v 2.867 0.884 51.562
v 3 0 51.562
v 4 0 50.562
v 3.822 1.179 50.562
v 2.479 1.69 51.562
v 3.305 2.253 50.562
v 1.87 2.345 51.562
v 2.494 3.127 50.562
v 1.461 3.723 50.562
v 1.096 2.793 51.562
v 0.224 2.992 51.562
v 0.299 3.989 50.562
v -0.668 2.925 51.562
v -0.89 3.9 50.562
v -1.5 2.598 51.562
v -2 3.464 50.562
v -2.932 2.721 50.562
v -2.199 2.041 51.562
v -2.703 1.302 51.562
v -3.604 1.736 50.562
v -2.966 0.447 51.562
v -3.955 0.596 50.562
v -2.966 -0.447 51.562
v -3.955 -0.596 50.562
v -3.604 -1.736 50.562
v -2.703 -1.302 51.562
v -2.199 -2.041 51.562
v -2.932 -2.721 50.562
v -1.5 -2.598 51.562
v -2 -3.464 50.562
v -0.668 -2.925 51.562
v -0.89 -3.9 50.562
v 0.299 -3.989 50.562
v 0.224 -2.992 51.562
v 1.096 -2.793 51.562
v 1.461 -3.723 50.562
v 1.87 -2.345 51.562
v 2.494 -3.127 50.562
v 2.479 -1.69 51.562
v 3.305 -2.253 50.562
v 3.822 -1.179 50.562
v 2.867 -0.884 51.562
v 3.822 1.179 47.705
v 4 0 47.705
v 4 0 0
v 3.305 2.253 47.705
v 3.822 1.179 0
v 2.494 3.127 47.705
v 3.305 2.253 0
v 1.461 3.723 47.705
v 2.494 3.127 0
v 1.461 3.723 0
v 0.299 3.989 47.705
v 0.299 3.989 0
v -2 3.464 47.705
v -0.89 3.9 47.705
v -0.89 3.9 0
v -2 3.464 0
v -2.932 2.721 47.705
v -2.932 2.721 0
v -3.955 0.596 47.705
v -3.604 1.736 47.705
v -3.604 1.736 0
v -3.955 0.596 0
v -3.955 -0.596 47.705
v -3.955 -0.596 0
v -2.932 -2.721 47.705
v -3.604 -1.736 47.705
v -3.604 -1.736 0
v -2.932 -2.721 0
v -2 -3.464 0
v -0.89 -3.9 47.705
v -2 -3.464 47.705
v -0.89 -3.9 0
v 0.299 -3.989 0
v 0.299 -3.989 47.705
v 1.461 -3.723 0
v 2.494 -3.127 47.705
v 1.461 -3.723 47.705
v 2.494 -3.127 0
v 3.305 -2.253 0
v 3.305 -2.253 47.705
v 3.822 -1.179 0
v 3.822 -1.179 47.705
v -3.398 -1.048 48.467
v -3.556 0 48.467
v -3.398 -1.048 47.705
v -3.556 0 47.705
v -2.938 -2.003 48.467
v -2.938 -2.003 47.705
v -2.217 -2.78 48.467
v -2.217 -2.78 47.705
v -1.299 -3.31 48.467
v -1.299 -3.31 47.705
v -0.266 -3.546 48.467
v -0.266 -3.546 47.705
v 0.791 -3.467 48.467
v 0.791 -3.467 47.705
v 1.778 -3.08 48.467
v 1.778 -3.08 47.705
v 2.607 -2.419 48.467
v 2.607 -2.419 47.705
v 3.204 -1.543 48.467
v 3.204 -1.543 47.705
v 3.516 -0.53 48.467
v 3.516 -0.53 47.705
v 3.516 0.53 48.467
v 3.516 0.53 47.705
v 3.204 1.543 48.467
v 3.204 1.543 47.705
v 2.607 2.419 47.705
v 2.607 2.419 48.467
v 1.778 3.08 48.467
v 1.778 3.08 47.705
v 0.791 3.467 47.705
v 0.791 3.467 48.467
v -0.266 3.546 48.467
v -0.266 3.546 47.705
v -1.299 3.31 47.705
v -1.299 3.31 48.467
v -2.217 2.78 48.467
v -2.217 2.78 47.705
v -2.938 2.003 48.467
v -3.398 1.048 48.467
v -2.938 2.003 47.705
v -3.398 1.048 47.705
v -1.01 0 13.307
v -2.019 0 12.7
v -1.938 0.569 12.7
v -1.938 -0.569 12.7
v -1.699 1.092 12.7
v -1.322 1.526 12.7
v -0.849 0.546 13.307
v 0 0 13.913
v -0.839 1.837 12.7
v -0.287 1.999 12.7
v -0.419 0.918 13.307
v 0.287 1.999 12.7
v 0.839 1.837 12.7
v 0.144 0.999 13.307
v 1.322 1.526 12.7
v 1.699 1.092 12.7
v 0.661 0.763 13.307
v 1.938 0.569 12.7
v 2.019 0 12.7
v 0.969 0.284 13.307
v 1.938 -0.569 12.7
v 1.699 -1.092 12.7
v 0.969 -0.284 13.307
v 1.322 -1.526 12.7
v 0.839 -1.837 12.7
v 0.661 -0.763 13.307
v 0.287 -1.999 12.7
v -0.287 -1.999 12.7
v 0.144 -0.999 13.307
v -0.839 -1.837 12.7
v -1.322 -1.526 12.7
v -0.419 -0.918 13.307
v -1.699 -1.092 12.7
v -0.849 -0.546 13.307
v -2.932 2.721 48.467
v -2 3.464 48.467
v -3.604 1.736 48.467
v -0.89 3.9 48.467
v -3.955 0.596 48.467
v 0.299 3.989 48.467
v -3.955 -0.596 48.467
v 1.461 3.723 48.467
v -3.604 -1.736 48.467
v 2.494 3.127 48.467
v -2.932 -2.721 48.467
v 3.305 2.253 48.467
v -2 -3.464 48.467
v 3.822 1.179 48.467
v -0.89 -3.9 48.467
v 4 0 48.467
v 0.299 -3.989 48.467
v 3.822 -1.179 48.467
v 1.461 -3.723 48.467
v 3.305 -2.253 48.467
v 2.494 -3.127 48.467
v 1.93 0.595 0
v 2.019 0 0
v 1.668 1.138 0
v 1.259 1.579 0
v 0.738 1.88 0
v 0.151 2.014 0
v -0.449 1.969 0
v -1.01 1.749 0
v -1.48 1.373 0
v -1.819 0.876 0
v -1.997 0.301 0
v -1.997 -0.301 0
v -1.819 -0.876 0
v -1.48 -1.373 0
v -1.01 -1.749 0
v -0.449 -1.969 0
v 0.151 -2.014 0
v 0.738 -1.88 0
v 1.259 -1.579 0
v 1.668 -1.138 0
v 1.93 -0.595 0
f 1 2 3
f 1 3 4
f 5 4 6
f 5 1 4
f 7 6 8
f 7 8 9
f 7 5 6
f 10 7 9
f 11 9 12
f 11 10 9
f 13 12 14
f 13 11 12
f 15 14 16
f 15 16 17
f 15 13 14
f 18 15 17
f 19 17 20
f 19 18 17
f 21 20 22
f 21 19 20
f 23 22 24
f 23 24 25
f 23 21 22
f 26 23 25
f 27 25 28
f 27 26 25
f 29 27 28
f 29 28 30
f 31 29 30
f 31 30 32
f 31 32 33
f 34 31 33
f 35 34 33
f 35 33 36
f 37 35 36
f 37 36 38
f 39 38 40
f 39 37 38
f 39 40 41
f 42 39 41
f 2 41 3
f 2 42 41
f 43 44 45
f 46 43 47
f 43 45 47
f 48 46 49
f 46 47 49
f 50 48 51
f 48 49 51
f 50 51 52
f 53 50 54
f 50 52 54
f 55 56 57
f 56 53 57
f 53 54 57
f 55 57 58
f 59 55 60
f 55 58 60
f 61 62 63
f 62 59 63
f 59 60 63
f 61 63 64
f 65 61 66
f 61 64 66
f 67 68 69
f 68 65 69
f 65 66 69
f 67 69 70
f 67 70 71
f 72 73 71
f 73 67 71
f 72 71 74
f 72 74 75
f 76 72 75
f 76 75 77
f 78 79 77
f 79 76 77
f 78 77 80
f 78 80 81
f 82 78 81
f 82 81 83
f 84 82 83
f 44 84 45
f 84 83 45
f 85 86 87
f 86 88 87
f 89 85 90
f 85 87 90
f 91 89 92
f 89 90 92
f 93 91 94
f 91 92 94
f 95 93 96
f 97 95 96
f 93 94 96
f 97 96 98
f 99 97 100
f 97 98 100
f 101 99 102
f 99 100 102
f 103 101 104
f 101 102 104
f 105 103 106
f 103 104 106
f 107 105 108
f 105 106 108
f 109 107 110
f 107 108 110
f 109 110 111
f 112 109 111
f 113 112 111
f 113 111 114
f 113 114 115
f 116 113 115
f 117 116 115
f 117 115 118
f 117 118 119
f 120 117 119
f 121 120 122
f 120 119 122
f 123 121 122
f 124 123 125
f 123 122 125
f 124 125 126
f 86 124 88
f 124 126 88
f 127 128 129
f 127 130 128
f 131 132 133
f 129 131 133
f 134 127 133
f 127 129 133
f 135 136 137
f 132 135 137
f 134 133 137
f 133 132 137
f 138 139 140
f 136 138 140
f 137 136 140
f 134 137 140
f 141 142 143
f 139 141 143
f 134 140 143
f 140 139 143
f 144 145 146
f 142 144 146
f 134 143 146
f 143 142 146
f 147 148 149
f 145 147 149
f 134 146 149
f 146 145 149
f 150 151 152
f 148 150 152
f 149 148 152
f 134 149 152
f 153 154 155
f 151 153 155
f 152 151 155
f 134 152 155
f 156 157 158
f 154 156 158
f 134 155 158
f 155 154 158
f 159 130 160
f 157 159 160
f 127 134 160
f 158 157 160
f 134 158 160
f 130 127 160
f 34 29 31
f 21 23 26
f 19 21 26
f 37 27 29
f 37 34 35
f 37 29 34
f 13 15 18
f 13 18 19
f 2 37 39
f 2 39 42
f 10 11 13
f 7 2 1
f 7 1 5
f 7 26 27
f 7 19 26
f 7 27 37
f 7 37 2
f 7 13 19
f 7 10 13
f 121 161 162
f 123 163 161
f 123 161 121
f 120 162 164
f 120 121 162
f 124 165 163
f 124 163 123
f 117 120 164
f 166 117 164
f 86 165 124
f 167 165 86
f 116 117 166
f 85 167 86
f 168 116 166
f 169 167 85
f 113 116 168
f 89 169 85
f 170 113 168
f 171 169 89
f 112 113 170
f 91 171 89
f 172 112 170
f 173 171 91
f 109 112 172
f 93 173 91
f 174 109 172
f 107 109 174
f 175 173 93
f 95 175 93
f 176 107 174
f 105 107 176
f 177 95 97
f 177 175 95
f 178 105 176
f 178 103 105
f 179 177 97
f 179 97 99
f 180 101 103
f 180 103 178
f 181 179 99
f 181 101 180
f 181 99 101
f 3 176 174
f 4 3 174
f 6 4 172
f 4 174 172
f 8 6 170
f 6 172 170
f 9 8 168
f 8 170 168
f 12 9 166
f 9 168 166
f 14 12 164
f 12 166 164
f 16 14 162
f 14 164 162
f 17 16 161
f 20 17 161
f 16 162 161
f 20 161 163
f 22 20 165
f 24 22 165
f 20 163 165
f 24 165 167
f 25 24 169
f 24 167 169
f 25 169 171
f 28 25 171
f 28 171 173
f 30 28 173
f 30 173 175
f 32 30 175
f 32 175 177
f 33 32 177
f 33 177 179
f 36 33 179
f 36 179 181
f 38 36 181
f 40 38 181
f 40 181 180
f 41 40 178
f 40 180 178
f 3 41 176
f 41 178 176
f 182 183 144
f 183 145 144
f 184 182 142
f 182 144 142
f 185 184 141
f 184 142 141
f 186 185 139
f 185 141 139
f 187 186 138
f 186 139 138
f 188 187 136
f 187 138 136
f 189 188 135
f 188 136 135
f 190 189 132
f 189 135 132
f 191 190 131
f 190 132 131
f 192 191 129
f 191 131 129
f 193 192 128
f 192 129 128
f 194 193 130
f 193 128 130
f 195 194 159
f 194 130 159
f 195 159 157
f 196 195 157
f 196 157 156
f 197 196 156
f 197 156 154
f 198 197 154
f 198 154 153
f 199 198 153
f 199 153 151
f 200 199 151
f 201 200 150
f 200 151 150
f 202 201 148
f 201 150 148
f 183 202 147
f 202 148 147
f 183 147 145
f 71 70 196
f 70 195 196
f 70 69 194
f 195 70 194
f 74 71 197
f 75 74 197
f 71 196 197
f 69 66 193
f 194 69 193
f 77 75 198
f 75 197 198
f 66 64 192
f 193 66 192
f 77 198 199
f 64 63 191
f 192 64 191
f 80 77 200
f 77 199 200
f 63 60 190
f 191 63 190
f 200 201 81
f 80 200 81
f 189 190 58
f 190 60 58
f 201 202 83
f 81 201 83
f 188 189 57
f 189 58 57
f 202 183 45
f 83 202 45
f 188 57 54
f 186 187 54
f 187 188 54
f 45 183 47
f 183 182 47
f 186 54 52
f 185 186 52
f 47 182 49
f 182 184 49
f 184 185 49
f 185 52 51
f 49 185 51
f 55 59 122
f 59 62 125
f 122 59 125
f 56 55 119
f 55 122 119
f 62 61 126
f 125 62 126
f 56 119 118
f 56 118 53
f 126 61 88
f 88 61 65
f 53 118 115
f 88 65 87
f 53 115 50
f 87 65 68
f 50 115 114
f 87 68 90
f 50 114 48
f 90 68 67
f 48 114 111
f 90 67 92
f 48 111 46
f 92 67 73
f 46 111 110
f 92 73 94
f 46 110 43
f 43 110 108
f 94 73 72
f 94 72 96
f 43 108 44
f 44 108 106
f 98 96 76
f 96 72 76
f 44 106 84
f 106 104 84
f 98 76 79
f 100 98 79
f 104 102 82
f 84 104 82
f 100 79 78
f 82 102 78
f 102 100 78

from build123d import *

# Parameters (mm, degrees)
SKETCH1_R                  = 4
BOSS_EXTRUDE1_DEPTH        = 51.562
SKETCH2_W                  = 0.444
SKETCH2_H                  = 0.762
CHAMFER2_SIZE              = 1
F_10_32_TAPPED_HOLE2_D     = 4.0386
F_10_32_TAPPED_HOLE2_DEPTH = 12.7
F_10_32_TAPPED_HOLE2_TIP   = 1.213317848


with BuildPart() as part:
    # Sketch1 → Boss-Extrude1 (new body)
    with BuildSketch(Plane.XY):
        Circle(SKETCH1_R)
    extrude(amount=BOSS_EXTRUDE1_DEPTH)

    # Sketch2 → Cut-Revolve1 (revolve, cut)
    with BuildSketch(Plane(origin=(0, 0, 0), x_dir=(1, 0, 0), z_dir=(0, 1, 0)), mode=Mode.PRIVATE) as cut_revolve1_sk:
        with Locations((3.778, -48.086)):
            Rectangle(SKETCH2_W, SKETCH2_H)
    revolve(cut_revolve1_sk.sketch.rotate(Axis((0, 0, 0), (0, 0, 1)), 180), axis=Axis((0, 0, 0), (0, 0, 1)), mode=Mode.SUBTRACT)

    # Chamfer2
    chamfer2_edges = [part.edges().sort_by_distance(p)[0] for p in [
        (-4, 0, 51.562),
    ]]
    chamfer(chamfer2_edges, length=CHAMFER2_SIZE)

    # #10-32 Tapped Hole2
    with Locations(Plane(origin=(0, 0, 0), x_dir=(-1, 0, 0), z_dir=(0, 0, -1))):
        with Locations((0, 0)):
            Hole(F_10_32_TAPPED_HOLE2_D / 2, depth=F_10_32_TAPPED_HOLE2_DEPTH)
            with Locations((0, 0, -(F_10_32_TAPPED_HOLE2_DEPTH + F_10_32_TAPPED_HOLE2_TIP / 2))):  # 118° drill point
                Cone(0, F_10_32_TAPPED_HOLE2_D / 2, F_10_32_TAPPED_HOLE2_TIP, mode=Mode.SUBTRACT)


solid = part.part
